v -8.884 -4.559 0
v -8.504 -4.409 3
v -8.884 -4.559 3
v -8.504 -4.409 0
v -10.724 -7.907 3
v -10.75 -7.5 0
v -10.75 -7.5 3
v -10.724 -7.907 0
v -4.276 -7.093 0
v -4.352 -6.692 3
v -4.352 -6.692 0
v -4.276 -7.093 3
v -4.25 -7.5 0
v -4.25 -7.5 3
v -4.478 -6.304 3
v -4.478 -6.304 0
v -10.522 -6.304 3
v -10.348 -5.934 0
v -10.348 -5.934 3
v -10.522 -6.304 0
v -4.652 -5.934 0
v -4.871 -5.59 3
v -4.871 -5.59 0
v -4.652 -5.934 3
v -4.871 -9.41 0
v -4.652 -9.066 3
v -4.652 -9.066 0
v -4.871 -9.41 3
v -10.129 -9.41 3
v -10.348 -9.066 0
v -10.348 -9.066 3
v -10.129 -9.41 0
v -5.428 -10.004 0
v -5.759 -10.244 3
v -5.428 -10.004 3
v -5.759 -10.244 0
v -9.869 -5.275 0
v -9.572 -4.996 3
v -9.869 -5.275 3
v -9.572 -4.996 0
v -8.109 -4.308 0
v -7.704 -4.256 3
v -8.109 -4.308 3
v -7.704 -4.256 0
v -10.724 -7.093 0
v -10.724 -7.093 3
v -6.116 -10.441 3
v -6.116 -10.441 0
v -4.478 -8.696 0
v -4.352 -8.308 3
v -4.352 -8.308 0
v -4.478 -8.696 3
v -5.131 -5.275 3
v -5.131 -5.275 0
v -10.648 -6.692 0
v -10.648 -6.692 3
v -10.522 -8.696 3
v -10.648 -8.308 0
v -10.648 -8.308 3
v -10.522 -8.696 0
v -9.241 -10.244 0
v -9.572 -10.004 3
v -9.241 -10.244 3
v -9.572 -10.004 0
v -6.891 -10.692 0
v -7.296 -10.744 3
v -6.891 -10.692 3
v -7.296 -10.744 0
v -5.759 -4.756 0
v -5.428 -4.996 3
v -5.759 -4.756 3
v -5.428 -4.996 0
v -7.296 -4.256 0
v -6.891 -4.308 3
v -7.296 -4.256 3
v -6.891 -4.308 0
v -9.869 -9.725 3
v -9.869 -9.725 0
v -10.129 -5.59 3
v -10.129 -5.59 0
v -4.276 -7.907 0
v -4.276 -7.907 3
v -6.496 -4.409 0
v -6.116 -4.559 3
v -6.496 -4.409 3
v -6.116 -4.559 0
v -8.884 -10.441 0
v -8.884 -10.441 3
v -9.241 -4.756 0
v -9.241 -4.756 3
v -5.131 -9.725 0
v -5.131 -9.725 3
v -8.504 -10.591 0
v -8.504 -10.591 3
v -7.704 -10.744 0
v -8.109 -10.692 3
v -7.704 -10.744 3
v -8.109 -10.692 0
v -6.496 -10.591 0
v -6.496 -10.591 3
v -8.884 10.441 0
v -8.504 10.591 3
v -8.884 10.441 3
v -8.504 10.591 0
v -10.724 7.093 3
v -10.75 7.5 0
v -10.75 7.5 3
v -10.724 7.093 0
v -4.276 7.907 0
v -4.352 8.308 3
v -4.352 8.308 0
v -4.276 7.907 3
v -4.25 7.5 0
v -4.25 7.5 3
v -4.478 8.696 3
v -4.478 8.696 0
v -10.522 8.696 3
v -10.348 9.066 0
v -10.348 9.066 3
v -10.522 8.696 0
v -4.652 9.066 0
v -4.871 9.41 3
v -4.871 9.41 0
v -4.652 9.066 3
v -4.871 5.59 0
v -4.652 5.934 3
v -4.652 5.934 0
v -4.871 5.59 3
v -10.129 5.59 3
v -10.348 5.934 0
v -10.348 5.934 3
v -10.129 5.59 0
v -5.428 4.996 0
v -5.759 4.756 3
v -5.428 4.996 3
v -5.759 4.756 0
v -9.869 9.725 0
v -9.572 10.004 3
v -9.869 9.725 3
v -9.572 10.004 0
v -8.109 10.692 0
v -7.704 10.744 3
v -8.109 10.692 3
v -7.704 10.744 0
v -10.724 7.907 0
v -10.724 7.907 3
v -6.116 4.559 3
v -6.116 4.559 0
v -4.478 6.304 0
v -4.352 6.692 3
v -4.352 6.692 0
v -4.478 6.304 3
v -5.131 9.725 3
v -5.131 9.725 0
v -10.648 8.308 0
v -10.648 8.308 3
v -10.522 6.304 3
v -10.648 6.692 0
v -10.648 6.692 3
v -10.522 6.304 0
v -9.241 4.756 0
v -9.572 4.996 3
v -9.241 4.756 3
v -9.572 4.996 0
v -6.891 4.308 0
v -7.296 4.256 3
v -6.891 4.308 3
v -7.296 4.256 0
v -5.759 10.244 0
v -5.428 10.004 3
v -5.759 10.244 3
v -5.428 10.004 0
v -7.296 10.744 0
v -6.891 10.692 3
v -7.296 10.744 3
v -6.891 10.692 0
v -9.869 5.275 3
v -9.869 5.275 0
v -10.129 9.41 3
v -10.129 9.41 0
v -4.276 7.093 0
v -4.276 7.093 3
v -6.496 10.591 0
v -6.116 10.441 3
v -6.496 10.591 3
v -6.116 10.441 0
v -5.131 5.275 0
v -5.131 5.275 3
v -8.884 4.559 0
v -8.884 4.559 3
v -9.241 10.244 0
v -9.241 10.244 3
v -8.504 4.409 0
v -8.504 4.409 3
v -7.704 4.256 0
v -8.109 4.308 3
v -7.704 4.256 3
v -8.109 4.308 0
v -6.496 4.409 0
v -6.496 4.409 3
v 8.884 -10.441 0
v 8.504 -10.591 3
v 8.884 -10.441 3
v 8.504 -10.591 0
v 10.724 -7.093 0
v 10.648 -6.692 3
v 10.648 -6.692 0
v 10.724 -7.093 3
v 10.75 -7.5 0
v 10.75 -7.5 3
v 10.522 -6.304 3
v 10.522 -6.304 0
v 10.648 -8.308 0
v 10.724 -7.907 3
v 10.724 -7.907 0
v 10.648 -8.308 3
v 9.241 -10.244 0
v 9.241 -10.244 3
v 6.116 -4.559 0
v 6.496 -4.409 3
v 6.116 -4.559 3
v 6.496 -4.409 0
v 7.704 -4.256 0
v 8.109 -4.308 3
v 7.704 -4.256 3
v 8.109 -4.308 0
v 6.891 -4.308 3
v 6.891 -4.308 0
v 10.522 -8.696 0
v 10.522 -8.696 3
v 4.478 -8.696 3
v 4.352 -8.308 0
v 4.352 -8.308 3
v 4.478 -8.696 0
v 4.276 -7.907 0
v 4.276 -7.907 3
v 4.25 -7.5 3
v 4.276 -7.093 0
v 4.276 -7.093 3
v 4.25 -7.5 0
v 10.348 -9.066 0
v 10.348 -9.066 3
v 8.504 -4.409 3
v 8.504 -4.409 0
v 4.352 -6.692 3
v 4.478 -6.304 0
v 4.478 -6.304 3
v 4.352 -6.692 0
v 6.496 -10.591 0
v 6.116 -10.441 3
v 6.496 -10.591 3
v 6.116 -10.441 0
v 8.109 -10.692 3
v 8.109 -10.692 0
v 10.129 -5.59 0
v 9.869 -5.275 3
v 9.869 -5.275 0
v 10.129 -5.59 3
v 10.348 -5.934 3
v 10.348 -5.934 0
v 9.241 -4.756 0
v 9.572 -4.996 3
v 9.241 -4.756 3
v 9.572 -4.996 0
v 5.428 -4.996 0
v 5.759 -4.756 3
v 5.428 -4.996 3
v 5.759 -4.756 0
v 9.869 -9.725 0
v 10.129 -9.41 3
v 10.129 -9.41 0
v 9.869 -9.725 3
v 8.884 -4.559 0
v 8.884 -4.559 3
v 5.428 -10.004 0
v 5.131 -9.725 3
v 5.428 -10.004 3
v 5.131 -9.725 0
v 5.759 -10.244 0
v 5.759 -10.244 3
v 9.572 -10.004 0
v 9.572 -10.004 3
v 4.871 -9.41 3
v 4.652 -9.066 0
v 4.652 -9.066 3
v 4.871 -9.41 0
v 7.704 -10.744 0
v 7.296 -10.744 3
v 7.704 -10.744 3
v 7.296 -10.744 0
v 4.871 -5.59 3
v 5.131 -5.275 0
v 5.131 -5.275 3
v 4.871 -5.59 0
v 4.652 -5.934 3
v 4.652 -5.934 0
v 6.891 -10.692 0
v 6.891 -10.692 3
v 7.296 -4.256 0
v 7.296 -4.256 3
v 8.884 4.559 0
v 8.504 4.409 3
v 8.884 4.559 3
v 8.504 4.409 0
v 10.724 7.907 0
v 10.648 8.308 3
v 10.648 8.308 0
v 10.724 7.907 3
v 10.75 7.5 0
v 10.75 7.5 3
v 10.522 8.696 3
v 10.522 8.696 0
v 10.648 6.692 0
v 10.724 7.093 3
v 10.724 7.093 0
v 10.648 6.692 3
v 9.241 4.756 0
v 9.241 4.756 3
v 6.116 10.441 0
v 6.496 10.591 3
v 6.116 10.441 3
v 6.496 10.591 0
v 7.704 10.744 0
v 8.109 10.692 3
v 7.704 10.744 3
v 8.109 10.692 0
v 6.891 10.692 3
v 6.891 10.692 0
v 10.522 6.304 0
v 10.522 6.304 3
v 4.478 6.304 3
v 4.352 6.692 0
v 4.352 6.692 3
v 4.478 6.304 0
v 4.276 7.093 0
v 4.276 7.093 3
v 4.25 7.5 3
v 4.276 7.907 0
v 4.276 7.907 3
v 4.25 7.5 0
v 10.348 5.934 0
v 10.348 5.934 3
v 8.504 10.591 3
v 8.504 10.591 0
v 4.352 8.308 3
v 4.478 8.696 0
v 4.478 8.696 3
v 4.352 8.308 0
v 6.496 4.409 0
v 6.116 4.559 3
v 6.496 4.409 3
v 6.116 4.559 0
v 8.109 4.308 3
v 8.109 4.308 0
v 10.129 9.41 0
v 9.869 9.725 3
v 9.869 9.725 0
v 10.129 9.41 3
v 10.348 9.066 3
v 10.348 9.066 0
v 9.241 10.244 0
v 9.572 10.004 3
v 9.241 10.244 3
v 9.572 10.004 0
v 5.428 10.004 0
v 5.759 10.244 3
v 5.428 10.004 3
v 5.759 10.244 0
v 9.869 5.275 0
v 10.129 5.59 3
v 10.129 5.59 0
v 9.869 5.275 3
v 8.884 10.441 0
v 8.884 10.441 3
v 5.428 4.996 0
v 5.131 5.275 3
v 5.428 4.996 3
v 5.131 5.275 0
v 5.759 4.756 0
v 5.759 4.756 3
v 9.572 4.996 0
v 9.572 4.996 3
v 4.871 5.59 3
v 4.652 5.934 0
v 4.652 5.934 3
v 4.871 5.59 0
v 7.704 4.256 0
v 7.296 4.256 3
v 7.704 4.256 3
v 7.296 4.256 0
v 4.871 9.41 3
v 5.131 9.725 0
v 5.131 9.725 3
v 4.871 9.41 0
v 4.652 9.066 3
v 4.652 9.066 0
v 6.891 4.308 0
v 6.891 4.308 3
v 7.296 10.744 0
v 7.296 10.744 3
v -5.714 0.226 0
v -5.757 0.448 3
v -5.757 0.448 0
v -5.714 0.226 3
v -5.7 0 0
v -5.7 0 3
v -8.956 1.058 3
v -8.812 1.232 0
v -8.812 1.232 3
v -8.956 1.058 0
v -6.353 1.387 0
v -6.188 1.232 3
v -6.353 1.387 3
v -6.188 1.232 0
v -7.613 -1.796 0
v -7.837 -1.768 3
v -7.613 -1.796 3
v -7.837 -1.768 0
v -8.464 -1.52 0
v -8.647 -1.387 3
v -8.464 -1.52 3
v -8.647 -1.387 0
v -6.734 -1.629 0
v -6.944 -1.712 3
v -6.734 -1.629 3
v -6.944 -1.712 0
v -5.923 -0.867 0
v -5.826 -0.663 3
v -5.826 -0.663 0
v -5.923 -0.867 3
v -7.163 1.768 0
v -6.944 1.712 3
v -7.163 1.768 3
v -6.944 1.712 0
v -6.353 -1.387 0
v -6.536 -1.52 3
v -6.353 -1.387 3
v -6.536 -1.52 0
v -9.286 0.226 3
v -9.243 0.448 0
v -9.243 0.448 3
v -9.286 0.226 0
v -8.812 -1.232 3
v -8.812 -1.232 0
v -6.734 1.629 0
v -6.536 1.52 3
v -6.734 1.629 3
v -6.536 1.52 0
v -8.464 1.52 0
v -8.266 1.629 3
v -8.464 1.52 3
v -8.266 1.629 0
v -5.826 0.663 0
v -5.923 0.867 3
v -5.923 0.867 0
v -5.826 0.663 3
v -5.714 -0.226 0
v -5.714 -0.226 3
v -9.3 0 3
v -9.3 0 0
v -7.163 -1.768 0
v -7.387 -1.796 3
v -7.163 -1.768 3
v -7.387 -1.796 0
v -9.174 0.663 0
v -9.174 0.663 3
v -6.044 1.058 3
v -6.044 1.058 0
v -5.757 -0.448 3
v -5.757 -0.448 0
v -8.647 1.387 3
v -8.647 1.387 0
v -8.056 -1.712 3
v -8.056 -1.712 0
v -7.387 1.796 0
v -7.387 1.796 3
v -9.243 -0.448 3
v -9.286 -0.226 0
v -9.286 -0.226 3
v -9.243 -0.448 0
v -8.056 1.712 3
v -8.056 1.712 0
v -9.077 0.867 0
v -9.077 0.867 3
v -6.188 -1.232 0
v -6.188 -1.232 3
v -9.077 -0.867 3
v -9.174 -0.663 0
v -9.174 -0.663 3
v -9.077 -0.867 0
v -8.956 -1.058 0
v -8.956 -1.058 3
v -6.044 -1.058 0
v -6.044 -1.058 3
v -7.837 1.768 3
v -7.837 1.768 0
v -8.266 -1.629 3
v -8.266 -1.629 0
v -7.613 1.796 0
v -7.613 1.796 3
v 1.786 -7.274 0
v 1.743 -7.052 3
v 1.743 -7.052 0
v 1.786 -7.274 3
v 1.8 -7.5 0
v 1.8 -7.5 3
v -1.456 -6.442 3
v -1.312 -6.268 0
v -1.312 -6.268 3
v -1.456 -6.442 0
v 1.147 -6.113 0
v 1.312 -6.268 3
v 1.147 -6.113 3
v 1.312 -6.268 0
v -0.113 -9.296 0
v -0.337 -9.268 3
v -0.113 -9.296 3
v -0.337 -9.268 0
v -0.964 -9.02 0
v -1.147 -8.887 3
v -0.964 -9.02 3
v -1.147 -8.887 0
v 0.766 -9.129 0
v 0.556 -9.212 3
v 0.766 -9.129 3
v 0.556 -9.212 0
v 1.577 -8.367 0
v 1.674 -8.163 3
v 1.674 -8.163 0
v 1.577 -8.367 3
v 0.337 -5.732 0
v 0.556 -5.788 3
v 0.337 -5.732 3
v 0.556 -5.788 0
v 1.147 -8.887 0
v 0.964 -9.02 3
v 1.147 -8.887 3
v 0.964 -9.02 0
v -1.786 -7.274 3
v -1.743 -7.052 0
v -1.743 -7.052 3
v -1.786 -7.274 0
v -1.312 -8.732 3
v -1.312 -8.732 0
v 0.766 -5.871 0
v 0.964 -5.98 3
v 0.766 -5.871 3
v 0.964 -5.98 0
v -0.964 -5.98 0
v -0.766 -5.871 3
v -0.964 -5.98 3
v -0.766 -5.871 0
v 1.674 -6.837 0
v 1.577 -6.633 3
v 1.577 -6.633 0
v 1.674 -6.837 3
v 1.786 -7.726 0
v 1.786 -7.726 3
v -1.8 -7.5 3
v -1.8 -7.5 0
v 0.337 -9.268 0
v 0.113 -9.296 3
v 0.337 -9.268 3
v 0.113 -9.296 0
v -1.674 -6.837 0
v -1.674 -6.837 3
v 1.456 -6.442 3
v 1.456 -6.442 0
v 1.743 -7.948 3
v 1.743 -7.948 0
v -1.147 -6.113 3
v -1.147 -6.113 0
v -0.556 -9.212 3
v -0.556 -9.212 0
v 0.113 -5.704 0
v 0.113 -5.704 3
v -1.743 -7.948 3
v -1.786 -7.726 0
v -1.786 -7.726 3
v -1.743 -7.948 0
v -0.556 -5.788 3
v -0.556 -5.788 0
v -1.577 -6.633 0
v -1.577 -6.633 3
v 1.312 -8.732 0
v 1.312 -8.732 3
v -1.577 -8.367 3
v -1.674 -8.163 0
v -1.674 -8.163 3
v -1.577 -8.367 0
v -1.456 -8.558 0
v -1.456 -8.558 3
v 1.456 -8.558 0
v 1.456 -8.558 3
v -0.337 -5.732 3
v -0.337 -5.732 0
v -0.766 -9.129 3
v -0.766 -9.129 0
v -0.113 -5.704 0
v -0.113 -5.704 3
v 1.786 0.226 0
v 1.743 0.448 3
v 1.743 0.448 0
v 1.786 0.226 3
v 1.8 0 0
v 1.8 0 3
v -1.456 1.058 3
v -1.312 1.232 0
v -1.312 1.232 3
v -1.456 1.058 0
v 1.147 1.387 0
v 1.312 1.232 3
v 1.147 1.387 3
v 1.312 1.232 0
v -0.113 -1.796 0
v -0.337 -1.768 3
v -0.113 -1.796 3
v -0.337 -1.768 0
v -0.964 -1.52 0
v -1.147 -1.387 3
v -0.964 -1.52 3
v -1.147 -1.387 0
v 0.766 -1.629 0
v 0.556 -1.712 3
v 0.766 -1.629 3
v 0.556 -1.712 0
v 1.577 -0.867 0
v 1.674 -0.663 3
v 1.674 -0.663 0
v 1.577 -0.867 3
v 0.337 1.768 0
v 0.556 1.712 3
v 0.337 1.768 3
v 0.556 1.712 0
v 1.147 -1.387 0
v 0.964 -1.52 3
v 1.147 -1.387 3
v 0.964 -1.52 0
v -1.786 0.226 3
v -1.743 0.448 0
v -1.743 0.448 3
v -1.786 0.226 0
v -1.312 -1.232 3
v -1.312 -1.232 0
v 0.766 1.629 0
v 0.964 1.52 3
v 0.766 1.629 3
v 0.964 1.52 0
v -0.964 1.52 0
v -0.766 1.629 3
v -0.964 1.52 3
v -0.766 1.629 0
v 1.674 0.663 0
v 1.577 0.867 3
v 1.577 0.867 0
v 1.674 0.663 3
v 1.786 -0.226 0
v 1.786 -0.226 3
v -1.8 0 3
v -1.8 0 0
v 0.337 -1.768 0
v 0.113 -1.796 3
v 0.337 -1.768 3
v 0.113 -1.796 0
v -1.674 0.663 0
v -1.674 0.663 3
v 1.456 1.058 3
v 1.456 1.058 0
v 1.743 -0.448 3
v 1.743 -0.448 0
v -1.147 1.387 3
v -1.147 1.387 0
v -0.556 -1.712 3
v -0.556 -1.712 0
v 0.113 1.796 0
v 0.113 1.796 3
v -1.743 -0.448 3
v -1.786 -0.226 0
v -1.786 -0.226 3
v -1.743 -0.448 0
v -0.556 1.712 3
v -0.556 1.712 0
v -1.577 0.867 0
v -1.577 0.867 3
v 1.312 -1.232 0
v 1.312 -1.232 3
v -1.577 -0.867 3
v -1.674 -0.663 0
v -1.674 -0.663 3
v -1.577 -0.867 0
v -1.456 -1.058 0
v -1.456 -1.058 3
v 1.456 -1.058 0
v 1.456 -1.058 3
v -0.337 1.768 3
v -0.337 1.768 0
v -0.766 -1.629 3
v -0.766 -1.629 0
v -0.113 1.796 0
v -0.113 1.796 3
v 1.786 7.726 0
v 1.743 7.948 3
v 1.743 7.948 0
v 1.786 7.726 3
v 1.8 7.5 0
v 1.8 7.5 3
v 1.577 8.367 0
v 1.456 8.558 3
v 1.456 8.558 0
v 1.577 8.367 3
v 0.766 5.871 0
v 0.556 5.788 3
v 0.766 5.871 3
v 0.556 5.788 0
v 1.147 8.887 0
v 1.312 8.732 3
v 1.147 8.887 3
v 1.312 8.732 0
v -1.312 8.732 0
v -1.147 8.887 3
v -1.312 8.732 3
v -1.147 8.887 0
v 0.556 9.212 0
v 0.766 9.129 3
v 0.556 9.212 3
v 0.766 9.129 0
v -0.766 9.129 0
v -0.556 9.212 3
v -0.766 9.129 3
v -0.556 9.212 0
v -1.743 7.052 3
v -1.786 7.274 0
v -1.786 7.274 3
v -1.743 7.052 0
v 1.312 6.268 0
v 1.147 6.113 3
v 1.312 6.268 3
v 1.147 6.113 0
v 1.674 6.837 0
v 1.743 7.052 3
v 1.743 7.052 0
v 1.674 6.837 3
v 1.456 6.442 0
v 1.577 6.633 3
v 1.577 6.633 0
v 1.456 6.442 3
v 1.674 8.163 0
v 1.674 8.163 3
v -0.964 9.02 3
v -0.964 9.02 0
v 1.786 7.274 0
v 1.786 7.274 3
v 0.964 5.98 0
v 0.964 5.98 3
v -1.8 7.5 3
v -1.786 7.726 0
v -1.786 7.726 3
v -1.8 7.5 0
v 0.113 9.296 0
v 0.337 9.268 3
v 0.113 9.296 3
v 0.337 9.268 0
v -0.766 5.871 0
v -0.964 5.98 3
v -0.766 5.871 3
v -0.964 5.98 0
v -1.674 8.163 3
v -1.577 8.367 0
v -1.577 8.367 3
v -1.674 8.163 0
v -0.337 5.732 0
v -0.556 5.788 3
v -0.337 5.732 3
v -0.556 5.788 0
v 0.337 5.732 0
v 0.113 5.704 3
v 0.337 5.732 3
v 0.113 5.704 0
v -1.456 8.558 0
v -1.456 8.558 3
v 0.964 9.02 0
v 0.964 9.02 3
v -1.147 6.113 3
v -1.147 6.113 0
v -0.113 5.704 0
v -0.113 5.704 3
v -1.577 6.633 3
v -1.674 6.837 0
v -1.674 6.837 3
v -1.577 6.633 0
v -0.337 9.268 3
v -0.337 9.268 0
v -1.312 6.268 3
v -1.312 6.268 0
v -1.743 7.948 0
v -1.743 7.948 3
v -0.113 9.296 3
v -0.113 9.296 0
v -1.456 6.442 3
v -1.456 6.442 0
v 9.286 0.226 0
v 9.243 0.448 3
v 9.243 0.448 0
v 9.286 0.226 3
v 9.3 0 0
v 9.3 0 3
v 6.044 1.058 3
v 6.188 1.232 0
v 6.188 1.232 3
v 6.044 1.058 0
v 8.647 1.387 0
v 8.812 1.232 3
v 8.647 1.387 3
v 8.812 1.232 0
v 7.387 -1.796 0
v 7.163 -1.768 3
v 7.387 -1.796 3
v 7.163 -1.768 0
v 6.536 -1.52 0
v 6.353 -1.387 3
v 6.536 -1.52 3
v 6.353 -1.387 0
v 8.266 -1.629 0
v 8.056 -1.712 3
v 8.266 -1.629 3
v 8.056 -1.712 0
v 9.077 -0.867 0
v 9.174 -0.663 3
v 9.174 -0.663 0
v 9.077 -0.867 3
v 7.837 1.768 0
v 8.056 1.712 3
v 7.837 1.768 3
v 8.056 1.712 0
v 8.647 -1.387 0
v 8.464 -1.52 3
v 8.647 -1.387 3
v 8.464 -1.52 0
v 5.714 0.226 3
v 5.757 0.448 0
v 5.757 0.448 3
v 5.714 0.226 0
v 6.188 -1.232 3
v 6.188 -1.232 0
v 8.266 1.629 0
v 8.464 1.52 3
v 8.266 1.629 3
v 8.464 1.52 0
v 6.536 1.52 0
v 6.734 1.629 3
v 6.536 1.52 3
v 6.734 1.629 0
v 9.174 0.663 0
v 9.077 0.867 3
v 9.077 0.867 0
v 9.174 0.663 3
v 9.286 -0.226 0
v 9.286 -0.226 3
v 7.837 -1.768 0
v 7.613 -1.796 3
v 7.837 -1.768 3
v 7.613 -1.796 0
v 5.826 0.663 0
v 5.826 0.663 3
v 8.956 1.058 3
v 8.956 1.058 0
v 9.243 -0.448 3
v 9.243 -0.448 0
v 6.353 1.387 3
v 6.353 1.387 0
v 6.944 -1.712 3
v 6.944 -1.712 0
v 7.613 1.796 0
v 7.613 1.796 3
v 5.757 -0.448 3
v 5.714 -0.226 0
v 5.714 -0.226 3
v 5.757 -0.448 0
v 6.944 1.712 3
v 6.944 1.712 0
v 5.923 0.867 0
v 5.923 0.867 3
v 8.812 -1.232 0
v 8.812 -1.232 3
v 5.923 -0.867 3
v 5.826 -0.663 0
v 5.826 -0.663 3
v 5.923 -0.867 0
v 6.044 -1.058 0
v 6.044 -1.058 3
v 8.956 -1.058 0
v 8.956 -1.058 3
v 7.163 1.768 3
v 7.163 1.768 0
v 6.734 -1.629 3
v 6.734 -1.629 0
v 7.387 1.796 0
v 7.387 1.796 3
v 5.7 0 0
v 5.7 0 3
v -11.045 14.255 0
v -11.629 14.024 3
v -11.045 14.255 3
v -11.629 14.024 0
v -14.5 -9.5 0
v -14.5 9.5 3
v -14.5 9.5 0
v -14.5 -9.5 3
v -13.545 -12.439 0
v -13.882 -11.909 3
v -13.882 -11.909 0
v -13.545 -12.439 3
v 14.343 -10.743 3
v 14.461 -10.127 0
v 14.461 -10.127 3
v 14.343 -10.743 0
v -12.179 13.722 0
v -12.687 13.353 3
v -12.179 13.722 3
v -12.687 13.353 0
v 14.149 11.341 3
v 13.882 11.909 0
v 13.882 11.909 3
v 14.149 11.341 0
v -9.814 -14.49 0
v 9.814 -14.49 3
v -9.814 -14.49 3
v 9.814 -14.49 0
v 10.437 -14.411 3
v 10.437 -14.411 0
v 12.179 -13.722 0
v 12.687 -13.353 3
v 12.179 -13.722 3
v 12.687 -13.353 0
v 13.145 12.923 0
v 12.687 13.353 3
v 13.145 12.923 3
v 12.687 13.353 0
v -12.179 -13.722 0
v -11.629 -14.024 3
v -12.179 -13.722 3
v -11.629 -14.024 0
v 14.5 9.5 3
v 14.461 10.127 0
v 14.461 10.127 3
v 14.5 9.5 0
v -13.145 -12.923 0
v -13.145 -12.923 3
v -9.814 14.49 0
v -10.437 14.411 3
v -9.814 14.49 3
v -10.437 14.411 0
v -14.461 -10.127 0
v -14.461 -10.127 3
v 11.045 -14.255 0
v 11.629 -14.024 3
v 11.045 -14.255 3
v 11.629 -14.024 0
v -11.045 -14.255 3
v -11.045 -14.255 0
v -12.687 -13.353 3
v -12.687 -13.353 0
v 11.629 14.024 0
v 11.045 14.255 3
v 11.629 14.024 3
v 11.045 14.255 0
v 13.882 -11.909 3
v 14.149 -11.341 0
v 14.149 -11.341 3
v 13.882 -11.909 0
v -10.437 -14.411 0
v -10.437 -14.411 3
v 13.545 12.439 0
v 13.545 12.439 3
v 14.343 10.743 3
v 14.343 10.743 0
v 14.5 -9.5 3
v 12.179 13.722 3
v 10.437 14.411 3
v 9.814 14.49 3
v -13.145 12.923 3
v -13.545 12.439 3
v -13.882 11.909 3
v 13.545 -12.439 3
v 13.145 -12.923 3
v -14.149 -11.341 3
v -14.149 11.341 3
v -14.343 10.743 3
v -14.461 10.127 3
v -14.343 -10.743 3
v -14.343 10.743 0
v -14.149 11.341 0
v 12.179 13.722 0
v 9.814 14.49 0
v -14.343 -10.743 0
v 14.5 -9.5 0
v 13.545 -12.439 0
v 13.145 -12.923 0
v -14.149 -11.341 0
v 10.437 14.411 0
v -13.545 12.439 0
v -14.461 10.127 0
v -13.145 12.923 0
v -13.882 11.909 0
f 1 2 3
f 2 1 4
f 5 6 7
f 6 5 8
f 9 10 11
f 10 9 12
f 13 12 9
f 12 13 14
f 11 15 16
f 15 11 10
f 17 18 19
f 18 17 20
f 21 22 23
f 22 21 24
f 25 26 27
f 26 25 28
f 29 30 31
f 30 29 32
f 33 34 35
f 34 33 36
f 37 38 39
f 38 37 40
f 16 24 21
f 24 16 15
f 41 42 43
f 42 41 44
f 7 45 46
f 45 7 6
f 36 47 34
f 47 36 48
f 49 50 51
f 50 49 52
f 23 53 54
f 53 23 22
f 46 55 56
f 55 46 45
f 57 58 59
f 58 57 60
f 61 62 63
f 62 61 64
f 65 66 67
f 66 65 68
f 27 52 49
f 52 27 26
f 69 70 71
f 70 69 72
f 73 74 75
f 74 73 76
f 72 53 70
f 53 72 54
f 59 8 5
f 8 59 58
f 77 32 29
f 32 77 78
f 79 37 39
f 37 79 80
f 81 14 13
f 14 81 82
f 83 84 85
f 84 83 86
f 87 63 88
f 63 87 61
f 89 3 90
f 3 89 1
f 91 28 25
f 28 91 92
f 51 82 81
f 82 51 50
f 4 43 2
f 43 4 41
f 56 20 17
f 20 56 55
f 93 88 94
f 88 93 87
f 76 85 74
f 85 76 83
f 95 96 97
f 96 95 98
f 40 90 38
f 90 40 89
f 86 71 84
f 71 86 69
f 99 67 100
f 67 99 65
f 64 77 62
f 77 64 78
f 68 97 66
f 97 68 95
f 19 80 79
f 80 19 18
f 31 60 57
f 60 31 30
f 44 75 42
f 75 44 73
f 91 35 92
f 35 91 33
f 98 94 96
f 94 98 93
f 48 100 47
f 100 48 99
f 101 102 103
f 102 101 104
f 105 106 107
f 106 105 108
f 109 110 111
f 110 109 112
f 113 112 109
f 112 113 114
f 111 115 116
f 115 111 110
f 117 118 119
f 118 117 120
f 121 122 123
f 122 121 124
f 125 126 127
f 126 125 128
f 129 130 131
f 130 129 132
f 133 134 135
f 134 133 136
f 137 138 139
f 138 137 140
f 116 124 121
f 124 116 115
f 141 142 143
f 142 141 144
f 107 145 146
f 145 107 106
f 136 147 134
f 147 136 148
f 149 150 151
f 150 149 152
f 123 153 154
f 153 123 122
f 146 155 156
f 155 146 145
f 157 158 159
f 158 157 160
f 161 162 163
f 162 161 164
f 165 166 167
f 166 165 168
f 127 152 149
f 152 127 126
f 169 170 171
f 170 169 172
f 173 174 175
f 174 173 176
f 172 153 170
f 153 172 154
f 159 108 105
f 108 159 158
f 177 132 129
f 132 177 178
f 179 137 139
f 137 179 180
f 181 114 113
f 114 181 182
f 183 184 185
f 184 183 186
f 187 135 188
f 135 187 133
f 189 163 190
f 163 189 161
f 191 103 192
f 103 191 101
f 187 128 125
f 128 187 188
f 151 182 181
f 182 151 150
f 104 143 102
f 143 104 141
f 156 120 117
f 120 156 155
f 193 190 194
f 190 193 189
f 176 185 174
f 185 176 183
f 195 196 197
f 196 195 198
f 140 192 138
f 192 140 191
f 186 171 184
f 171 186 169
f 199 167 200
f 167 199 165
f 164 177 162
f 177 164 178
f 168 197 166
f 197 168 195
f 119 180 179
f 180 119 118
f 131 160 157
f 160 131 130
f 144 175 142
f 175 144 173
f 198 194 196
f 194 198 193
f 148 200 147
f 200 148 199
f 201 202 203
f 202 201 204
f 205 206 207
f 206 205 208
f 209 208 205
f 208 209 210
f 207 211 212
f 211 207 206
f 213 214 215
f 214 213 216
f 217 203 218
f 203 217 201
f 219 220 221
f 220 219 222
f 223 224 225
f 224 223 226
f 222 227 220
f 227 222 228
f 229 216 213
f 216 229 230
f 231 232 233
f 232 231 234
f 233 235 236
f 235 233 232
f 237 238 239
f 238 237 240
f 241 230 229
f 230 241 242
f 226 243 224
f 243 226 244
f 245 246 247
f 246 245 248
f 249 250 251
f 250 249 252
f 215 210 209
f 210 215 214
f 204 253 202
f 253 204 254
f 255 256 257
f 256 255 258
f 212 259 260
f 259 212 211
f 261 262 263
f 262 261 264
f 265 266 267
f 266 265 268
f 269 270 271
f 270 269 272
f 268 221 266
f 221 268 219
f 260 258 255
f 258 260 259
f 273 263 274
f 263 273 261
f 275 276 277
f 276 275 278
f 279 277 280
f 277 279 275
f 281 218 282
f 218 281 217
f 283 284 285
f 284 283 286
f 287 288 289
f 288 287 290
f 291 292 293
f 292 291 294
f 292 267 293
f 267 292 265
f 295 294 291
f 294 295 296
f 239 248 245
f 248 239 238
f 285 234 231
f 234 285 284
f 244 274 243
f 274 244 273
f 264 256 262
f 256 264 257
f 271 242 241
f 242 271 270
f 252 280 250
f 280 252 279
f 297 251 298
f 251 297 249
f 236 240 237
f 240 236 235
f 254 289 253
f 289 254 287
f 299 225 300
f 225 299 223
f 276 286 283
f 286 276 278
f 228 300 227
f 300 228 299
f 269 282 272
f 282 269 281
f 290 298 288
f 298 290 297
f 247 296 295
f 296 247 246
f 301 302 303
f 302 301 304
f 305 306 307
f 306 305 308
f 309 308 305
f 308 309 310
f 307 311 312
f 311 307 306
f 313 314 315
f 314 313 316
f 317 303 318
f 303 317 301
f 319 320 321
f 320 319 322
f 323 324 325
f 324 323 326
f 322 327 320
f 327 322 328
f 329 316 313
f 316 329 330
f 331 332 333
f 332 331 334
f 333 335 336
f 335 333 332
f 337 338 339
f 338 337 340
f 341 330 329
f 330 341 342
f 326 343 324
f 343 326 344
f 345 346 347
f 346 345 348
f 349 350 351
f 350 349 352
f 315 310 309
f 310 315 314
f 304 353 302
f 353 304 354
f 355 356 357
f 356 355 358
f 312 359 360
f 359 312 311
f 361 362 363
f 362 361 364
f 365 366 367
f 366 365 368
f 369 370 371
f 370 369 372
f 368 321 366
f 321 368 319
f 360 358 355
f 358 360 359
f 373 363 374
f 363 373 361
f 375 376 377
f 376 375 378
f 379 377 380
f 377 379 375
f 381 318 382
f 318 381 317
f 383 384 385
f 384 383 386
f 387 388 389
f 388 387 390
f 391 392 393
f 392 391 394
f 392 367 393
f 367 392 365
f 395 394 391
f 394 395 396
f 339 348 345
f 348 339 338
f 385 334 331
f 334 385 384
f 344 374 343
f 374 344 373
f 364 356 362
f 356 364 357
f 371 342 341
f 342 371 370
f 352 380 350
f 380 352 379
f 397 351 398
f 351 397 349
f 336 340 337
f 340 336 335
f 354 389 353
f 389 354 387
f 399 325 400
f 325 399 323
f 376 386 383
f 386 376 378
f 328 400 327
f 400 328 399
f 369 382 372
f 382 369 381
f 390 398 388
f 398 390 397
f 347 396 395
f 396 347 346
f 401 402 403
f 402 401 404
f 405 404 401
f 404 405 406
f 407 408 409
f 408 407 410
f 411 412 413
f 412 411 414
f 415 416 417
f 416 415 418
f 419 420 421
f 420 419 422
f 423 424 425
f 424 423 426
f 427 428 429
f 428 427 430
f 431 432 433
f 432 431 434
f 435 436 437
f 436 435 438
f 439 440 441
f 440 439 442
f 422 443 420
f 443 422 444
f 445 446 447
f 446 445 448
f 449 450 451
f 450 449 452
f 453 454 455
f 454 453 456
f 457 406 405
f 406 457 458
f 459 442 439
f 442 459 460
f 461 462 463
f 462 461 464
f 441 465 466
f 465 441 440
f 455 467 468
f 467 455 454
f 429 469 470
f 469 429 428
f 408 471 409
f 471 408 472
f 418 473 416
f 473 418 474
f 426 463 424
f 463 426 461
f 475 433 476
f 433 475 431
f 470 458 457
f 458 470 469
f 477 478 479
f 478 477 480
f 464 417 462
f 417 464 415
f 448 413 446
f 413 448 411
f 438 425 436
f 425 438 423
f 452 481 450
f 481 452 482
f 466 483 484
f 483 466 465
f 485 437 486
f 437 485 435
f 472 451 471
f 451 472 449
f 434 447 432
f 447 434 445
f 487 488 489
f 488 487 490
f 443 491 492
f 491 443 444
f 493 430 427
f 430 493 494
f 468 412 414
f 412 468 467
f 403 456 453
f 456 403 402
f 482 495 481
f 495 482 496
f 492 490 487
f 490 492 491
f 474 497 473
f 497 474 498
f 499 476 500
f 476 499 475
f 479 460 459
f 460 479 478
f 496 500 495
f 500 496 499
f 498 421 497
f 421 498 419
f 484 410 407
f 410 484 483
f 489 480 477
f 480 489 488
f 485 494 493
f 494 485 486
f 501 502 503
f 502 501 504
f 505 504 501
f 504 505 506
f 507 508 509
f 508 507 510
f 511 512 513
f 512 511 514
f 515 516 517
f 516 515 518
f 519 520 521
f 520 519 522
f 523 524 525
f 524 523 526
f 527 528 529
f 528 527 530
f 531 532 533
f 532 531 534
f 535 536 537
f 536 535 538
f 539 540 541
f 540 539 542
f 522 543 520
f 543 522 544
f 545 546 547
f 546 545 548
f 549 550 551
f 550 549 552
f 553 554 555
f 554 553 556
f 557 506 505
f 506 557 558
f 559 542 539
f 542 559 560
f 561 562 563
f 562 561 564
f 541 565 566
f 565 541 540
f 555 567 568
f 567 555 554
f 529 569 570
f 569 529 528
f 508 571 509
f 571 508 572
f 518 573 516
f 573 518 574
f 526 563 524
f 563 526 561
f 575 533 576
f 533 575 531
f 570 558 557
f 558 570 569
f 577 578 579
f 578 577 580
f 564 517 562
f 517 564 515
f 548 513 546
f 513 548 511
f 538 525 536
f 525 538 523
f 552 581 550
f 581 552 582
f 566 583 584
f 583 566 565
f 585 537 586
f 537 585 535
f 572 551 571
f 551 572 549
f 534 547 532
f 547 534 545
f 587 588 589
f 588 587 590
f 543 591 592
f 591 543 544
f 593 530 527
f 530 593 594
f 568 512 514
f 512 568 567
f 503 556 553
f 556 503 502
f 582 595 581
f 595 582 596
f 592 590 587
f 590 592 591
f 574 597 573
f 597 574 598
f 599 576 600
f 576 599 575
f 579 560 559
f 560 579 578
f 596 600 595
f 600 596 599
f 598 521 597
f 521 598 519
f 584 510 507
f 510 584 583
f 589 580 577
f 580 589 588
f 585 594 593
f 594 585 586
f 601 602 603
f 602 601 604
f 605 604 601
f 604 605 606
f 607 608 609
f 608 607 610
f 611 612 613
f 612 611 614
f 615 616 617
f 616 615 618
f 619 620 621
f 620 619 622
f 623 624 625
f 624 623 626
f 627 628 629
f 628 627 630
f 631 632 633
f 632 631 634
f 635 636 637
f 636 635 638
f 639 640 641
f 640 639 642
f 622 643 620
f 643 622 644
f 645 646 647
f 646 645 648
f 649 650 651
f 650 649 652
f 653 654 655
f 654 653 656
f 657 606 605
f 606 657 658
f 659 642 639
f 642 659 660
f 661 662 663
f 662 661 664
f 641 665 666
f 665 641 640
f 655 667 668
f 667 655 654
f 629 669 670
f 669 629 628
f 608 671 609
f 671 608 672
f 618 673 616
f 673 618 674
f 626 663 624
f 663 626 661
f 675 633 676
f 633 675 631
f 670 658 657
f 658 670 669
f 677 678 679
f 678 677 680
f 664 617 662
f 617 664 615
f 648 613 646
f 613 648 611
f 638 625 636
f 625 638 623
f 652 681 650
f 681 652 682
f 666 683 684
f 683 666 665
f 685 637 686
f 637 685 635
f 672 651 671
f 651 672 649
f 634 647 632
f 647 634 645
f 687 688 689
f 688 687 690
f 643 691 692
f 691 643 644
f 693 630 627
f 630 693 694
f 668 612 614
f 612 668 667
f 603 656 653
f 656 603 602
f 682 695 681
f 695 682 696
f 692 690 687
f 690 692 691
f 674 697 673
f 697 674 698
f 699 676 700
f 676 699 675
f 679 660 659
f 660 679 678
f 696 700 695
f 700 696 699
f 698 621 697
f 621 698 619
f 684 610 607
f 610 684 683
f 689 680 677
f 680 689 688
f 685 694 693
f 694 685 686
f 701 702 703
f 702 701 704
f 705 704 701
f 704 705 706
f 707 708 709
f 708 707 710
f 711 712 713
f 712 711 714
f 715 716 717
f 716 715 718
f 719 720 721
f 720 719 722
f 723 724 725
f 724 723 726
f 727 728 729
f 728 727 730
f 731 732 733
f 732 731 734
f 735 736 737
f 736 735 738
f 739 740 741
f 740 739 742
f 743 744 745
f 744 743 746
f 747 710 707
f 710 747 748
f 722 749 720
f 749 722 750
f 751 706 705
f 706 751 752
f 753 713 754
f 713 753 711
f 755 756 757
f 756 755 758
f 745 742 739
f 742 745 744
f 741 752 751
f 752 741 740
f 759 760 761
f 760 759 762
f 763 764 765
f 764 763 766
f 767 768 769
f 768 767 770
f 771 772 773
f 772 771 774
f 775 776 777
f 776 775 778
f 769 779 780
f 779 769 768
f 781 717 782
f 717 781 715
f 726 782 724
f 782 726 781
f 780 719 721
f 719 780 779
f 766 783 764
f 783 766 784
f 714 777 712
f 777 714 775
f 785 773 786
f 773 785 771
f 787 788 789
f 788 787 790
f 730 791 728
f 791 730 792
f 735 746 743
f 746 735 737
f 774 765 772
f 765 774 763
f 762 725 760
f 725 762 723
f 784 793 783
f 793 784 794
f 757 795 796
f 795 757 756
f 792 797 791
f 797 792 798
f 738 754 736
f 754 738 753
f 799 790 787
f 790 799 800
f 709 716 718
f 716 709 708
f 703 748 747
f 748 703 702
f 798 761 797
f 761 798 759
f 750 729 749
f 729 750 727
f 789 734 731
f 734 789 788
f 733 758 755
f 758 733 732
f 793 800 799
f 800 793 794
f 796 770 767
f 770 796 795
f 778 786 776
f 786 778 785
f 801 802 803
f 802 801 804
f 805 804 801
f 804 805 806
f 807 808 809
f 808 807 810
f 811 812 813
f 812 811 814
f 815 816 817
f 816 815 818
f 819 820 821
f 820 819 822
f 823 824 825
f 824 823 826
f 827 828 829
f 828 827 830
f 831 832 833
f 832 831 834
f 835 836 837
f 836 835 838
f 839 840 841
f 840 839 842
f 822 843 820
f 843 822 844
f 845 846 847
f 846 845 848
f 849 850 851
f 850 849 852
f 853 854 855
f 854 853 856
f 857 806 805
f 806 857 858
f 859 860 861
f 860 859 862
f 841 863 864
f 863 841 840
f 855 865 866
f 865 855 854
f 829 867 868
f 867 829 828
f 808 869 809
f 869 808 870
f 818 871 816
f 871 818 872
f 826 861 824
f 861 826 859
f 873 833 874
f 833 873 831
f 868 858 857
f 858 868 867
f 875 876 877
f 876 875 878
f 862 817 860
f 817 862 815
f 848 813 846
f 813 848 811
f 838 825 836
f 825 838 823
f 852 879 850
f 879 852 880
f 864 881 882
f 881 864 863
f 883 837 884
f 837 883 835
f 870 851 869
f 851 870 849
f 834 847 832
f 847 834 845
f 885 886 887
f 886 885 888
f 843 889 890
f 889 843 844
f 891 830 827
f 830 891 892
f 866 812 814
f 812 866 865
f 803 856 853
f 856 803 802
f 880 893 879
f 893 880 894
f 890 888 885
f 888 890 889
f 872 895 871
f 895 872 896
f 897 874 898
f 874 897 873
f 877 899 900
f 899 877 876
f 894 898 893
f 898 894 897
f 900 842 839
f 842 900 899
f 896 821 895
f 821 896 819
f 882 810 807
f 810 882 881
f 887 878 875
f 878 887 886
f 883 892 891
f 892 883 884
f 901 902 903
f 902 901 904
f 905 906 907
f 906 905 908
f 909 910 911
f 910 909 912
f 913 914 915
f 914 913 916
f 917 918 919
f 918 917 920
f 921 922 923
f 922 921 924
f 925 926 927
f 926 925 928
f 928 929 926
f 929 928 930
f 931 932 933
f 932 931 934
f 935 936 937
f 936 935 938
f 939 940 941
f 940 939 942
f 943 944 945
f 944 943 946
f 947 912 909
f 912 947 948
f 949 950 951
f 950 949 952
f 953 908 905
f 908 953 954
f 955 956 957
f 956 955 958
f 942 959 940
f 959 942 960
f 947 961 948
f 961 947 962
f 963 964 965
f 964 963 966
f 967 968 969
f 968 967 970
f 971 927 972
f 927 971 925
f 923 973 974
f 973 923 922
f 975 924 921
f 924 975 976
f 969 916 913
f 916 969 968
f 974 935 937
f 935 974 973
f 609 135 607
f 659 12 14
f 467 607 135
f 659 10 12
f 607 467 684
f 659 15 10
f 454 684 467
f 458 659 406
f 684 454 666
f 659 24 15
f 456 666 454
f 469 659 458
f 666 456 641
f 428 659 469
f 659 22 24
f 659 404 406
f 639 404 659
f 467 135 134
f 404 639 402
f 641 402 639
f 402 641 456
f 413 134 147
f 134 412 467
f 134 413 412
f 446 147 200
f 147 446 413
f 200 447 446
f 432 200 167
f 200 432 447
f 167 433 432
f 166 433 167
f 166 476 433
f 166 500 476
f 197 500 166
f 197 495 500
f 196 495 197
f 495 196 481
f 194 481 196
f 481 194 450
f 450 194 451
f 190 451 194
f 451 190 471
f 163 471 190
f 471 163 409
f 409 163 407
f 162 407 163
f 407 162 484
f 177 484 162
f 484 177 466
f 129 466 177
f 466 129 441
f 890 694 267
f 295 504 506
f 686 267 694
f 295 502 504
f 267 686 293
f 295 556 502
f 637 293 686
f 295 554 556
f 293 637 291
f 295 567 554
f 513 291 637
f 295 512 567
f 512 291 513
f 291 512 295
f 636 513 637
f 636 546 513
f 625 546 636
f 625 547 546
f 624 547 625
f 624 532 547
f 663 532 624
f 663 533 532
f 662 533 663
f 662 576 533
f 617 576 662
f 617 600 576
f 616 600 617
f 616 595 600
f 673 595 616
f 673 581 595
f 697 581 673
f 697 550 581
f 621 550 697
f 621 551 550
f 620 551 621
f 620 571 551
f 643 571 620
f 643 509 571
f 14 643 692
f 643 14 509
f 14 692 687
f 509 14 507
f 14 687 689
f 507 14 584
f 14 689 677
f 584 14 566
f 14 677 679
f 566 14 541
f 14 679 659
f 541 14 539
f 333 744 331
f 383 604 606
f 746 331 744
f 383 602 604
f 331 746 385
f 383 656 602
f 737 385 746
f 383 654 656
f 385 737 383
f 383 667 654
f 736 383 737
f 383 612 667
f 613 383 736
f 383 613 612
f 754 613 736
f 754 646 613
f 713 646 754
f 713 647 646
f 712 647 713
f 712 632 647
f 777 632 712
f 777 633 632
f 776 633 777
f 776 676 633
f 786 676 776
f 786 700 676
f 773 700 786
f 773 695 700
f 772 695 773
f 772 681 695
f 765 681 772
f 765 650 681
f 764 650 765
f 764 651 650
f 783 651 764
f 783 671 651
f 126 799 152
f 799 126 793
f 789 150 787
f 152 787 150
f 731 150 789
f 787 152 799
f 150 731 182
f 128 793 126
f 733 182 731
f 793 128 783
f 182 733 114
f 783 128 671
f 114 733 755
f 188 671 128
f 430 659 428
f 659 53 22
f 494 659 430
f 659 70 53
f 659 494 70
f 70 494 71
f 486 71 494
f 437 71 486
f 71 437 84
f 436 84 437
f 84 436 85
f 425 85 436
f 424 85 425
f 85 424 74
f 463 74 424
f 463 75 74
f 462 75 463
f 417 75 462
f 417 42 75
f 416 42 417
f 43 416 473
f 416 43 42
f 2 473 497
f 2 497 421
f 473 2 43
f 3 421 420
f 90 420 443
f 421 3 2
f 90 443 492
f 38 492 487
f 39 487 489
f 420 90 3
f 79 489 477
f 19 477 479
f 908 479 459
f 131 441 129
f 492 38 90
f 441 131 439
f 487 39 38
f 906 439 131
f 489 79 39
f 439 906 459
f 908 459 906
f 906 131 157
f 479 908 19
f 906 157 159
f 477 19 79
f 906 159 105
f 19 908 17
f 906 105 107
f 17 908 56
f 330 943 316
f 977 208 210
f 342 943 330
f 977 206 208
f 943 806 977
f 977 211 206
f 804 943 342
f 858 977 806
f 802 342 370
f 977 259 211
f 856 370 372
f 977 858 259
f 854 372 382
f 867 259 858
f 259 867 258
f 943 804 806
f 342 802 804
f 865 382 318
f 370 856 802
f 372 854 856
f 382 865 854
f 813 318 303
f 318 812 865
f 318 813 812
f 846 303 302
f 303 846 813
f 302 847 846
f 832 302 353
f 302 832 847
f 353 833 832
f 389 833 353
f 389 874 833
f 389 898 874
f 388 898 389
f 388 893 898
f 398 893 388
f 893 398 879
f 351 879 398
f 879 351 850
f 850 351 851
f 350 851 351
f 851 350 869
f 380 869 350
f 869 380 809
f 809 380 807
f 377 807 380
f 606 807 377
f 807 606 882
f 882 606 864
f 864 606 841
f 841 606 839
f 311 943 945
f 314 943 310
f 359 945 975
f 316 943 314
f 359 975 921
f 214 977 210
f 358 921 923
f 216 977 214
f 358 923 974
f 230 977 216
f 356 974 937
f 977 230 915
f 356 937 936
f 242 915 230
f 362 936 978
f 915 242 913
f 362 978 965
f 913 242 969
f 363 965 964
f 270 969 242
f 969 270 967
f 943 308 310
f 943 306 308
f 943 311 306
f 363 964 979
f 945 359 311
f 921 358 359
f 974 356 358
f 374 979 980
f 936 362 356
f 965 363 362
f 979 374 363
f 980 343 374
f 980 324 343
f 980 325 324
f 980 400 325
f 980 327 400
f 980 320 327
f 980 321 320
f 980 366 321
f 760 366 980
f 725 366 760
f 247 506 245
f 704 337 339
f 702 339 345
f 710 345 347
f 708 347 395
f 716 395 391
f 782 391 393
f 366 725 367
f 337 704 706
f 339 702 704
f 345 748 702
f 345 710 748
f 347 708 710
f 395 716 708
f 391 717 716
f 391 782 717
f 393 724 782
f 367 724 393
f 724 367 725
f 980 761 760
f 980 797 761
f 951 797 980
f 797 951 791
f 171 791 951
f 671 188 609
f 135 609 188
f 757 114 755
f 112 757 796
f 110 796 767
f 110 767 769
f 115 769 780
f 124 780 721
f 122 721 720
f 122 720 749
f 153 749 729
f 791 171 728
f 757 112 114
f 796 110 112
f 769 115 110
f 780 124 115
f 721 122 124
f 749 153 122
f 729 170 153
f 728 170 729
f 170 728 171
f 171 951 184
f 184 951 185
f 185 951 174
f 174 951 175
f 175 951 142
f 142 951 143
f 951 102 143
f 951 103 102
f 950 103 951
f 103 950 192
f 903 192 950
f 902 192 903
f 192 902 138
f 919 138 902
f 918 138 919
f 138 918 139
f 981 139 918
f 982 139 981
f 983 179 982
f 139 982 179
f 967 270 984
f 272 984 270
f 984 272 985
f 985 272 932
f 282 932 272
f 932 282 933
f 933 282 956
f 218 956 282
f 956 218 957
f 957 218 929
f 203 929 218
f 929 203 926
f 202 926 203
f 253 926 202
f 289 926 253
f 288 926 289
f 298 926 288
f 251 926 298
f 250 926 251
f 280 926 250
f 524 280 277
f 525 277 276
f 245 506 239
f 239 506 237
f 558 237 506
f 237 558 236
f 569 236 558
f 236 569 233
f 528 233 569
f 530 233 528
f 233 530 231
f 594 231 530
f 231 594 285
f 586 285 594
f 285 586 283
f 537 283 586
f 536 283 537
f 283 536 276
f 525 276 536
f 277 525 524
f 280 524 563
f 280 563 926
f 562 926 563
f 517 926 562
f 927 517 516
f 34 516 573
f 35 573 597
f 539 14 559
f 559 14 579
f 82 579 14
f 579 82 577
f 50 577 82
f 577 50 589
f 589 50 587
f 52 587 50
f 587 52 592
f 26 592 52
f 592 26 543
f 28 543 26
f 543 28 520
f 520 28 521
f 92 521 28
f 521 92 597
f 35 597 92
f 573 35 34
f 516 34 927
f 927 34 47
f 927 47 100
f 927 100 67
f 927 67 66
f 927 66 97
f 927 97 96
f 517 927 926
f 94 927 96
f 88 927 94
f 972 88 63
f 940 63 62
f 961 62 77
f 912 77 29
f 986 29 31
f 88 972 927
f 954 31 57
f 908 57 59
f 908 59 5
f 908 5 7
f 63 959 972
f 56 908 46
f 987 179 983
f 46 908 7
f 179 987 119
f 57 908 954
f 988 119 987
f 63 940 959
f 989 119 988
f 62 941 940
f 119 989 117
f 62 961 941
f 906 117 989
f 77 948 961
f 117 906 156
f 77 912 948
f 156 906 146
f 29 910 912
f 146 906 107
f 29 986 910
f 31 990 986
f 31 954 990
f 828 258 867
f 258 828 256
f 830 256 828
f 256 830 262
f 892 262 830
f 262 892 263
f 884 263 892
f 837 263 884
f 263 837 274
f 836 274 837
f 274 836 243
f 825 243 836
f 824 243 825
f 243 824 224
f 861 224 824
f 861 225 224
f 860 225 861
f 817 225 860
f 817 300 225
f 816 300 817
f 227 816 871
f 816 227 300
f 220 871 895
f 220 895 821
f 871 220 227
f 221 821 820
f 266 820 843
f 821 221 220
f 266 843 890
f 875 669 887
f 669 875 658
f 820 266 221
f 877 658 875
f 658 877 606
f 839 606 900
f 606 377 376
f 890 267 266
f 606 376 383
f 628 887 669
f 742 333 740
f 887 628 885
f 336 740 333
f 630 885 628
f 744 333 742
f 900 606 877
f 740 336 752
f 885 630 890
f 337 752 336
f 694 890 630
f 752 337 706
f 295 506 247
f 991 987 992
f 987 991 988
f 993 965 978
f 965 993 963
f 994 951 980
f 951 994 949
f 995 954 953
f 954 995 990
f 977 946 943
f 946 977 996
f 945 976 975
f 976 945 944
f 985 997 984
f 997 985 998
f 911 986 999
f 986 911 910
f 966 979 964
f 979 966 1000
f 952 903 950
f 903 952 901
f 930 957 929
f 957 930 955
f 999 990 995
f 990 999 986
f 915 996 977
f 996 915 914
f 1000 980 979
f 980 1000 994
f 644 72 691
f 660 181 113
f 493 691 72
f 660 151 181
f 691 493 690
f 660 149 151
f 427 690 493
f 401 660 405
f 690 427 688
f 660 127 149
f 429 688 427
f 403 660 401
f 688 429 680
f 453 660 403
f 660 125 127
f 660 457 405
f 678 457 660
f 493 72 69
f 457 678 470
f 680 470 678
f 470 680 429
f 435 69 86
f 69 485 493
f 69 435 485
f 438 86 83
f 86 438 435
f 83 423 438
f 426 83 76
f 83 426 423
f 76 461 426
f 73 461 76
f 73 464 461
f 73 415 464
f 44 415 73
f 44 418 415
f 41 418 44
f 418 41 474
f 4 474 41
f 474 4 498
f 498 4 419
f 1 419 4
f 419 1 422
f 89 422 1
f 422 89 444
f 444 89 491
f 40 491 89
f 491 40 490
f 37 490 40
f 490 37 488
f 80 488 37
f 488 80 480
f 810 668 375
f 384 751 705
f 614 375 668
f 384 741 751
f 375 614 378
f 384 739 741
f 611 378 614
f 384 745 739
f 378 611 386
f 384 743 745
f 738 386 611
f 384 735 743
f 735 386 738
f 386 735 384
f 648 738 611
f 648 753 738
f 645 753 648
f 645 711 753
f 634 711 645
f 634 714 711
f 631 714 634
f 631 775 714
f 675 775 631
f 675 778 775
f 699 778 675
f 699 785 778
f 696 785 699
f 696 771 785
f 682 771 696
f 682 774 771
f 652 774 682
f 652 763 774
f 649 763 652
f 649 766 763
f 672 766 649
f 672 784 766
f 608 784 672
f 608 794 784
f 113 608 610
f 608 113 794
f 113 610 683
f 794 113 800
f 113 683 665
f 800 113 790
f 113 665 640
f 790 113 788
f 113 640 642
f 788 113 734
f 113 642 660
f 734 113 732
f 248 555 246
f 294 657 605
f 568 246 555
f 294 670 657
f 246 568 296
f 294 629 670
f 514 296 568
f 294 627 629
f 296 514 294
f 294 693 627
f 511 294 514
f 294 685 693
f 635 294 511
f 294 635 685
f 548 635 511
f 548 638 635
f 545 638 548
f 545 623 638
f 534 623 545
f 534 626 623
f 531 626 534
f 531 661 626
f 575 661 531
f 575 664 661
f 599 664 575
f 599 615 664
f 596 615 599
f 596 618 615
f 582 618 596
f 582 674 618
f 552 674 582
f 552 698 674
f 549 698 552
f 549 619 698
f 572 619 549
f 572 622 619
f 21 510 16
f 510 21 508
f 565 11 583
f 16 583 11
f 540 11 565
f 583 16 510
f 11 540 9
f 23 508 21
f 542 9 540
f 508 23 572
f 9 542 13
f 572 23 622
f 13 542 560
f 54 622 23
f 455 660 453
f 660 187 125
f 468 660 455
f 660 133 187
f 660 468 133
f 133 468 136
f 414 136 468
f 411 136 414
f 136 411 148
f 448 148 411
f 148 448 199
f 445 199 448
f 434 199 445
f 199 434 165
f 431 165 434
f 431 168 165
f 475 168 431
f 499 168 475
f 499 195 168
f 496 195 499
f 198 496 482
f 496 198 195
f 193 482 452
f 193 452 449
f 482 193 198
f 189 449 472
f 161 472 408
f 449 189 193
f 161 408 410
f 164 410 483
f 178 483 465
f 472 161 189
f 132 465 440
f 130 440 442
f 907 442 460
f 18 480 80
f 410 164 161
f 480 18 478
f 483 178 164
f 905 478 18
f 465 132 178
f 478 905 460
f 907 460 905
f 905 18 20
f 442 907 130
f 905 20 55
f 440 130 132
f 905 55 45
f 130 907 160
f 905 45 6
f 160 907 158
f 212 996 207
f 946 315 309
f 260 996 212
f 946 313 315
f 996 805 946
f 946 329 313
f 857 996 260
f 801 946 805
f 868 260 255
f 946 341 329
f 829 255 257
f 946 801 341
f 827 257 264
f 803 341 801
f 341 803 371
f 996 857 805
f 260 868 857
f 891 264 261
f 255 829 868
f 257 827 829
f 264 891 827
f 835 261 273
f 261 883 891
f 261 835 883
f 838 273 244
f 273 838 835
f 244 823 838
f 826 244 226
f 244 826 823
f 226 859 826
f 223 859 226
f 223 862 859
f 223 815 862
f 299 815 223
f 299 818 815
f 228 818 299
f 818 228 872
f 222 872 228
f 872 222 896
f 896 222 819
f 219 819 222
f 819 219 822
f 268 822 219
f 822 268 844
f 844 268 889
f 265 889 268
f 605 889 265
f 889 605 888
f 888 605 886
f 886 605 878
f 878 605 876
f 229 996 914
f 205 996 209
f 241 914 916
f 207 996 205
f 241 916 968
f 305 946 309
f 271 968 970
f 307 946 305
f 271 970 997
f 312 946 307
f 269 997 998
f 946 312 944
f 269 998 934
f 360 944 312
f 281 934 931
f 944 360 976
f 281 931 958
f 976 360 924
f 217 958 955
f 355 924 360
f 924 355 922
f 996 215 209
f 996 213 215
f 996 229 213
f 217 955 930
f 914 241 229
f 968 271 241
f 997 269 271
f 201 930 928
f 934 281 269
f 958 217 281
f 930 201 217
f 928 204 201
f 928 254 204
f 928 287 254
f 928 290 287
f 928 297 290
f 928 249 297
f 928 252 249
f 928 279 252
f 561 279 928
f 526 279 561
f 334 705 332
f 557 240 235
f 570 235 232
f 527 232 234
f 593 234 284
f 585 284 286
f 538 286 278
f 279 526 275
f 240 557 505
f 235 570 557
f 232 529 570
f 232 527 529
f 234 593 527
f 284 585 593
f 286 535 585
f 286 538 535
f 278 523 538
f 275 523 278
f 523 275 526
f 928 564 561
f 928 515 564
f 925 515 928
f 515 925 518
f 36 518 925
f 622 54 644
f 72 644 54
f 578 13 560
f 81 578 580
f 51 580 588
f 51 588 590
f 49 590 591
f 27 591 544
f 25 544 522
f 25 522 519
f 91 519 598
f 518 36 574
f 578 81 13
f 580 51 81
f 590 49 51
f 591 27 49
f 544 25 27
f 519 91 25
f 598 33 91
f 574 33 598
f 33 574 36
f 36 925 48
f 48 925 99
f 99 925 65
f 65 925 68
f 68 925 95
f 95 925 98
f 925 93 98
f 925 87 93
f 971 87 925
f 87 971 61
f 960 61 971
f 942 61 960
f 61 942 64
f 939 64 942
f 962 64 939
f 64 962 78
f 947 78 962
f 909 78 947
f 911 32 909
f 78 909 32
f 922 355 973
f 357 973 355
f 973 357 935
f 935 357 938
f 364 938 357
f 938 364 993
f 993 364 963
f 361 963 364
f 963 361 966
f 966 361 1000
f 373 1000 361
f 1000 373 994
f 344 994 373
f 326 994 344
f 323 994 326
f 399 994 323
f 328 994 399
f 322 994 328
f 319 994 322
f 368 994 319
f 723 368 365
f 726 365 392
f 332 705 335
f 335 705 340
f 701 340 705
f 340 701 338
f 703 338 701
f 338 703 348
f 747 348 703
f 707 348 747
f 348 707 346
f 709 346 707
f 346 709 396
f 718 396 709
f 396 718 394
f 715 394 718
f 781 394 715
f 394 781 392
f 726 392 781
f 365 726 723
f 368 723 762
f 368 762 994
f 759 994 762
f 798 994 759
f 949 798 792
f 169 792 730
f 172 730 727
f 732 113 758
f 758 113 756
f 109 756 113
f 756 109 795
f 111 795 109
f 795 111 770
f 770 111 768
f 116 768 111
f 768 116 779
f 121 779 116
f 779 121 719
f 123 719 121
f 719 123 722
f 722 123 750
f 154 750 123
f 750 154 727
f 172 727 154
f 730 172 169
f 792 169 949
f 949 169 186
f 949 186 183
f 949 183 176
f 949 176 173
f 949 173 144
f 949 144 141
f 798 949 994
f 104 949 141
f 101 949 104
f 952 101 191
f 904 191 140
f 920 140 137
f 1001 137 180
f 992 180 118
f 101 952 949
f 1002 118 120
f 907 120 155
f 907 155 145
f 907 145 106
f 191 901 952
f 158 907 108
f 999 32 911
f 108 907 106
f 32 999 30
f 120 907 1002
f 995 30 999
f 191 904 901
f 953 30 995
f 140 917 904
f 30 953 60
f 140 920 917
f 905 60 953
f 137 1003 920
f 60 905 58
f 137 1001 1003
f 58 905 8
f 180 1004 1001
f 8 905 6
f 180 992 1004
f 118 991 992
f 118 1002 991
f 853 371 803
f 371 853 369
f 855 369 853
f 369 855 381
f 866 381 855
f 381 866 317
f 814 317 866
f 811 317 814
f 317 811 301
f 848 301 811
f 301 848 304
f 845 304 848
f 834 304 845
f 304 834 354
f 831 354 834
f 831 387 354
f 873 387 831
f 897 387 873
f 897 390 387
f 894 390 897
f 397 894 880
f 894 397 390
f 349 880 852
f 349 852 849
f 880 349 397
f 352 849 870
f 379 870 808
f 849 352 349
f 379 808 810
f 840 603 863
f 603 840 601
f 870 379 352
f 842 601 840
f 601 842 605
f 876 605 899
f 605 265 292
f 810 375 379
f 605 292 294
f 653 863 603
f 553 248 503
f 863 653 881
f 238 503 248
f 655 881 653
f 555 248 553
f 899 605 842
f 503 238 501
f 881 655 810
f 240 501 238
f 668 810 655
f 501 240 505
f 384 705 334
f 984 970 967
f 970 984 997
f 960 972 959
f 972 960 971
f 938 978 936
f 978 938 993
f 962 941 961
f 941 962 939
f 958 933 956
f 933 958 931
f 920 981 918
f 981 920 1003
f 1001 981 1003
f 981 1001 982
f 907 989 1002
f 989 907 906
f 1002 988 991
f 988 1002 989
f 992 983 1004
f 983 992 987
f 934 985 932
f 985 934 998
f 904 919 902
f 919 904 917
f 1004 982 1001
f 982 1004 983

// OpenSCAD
$fn = 50;


difference() {
	union() {
		*color(alpha = 1.0000000000, c = "gray") {
			translate(v = [0, 7, 0]) {
				linear_extrude(height = 1) {
					text(font = "Arial:style=Bold", halign = "center", size = 4.5000000000, text = "COMMENT plate main", valign = "center");
				}
			}
		}
		hull() {
			translate(v = [-9.5000000000, 9.5000000000, 0]) {
				cylinder(h = 3, r = 5);
			}
			translate(v = [9.5000000000, 9.5000000000, 0]) {
				cylinder(h = 3, r = 5);
			}
			translate(v = [-9.5000000000, -9.5000000000, 0]) {
				cylinder(h = 3, r = 5);
			}
			translate(v = [9.5000000000, -9.5000000000, 0]) {
				cylinder(h = 3, r = 5);
			}
		}
	}
	union() {
		*color(alpha = 1.0000000000, c = "gray") {
			translate(v = [0, 7, 0]) {
				linear_extrude(height = 1) {
					text(font = "Arial:style=Bold", halign = "center", size = 4.5000000000, text = "COMMENT holes main", valign = "center");
				}
			}
		}
		translate(v = [-7.5000000000, -7.5000000000, 0]) {
			translate(v = [0, 0, -100]) {
				cylinder(h = 200, r = 3.2500000000);
			}
		}
		translate(v = [-7.5000000000, 7.5000000000, 0]) {
			translate(v = [0, 0, -100]) {
				cylinder(h = 200, r = 3.2500000000);
			}
		}
		translate(v = [7.5000000000, -7.5000000000, 0]) {
			translate(v = [0, 0, -100]) {
				cylinder(h = 200, r = 3.2500000000);
			}
		}
		translate(v = [7.5000000000, 7.5000000000, 0]) {
			translate(v = [0, 0, -100]) {
				cylinder(h = 200, r = 3.2500000000);
			}
		}
		translate(v = [-7.5000000000, -7.5000000000, 0]) {
			translate(v = [0, 0, -100]) {
				cylinder(h = 200, r = 1.8000000000);
			}
		}
		translate(v = [-7.5000000000, 0.0000000000, 0]) {
			translate(v = [0, 0, -100]) {
				cylinder(h = 200, r = 1.8000000000);
			}
		}
		translate(v = [-7.5000000000, 7.5000000000, 0]) {
			translate(v = [0, 0, -100]) {
				cylinder(h = 200, r = 1.8000000000);
			}
		}
		translate(v = [0.0000000000, -7.5000000000, 0]) {
			translate(v = [0, 0, -100]) {
				cylinder(h = 200, r = 1.8000000000);
			}
		}
		translate(v = [0, 0, -100]) {
			cylinder(h = 200, r = 1.8000000000);
		}
		translate(v = [0.0000000000, 7.5000000000, 0]) {
			translate(v = [0, 0, -100]) {
				cylinder(h = 200, r = 1.8000000000);
			}
		}
		translate(v = [7.5000000000, -7.5000000000, 0]) {
			translate(v = [0, 0, -100]) {
				cylinder(h = 200, r = 1.8000000000);
			}
		}
		translate(v = [7.5000000000, 0.0000000000, 0]) {
			translate(v = [0, 0, -100]) {
				cylinder(h = 200, r = 1.8000000000);
			}
		}
		translate(v = [7.5000000000, 7.5000000000, 0]) {
			translate(v = [0, 0, -100]) {
				cylinder(h = 200, r = 1.8000000000);
			}
		}
	}
}
